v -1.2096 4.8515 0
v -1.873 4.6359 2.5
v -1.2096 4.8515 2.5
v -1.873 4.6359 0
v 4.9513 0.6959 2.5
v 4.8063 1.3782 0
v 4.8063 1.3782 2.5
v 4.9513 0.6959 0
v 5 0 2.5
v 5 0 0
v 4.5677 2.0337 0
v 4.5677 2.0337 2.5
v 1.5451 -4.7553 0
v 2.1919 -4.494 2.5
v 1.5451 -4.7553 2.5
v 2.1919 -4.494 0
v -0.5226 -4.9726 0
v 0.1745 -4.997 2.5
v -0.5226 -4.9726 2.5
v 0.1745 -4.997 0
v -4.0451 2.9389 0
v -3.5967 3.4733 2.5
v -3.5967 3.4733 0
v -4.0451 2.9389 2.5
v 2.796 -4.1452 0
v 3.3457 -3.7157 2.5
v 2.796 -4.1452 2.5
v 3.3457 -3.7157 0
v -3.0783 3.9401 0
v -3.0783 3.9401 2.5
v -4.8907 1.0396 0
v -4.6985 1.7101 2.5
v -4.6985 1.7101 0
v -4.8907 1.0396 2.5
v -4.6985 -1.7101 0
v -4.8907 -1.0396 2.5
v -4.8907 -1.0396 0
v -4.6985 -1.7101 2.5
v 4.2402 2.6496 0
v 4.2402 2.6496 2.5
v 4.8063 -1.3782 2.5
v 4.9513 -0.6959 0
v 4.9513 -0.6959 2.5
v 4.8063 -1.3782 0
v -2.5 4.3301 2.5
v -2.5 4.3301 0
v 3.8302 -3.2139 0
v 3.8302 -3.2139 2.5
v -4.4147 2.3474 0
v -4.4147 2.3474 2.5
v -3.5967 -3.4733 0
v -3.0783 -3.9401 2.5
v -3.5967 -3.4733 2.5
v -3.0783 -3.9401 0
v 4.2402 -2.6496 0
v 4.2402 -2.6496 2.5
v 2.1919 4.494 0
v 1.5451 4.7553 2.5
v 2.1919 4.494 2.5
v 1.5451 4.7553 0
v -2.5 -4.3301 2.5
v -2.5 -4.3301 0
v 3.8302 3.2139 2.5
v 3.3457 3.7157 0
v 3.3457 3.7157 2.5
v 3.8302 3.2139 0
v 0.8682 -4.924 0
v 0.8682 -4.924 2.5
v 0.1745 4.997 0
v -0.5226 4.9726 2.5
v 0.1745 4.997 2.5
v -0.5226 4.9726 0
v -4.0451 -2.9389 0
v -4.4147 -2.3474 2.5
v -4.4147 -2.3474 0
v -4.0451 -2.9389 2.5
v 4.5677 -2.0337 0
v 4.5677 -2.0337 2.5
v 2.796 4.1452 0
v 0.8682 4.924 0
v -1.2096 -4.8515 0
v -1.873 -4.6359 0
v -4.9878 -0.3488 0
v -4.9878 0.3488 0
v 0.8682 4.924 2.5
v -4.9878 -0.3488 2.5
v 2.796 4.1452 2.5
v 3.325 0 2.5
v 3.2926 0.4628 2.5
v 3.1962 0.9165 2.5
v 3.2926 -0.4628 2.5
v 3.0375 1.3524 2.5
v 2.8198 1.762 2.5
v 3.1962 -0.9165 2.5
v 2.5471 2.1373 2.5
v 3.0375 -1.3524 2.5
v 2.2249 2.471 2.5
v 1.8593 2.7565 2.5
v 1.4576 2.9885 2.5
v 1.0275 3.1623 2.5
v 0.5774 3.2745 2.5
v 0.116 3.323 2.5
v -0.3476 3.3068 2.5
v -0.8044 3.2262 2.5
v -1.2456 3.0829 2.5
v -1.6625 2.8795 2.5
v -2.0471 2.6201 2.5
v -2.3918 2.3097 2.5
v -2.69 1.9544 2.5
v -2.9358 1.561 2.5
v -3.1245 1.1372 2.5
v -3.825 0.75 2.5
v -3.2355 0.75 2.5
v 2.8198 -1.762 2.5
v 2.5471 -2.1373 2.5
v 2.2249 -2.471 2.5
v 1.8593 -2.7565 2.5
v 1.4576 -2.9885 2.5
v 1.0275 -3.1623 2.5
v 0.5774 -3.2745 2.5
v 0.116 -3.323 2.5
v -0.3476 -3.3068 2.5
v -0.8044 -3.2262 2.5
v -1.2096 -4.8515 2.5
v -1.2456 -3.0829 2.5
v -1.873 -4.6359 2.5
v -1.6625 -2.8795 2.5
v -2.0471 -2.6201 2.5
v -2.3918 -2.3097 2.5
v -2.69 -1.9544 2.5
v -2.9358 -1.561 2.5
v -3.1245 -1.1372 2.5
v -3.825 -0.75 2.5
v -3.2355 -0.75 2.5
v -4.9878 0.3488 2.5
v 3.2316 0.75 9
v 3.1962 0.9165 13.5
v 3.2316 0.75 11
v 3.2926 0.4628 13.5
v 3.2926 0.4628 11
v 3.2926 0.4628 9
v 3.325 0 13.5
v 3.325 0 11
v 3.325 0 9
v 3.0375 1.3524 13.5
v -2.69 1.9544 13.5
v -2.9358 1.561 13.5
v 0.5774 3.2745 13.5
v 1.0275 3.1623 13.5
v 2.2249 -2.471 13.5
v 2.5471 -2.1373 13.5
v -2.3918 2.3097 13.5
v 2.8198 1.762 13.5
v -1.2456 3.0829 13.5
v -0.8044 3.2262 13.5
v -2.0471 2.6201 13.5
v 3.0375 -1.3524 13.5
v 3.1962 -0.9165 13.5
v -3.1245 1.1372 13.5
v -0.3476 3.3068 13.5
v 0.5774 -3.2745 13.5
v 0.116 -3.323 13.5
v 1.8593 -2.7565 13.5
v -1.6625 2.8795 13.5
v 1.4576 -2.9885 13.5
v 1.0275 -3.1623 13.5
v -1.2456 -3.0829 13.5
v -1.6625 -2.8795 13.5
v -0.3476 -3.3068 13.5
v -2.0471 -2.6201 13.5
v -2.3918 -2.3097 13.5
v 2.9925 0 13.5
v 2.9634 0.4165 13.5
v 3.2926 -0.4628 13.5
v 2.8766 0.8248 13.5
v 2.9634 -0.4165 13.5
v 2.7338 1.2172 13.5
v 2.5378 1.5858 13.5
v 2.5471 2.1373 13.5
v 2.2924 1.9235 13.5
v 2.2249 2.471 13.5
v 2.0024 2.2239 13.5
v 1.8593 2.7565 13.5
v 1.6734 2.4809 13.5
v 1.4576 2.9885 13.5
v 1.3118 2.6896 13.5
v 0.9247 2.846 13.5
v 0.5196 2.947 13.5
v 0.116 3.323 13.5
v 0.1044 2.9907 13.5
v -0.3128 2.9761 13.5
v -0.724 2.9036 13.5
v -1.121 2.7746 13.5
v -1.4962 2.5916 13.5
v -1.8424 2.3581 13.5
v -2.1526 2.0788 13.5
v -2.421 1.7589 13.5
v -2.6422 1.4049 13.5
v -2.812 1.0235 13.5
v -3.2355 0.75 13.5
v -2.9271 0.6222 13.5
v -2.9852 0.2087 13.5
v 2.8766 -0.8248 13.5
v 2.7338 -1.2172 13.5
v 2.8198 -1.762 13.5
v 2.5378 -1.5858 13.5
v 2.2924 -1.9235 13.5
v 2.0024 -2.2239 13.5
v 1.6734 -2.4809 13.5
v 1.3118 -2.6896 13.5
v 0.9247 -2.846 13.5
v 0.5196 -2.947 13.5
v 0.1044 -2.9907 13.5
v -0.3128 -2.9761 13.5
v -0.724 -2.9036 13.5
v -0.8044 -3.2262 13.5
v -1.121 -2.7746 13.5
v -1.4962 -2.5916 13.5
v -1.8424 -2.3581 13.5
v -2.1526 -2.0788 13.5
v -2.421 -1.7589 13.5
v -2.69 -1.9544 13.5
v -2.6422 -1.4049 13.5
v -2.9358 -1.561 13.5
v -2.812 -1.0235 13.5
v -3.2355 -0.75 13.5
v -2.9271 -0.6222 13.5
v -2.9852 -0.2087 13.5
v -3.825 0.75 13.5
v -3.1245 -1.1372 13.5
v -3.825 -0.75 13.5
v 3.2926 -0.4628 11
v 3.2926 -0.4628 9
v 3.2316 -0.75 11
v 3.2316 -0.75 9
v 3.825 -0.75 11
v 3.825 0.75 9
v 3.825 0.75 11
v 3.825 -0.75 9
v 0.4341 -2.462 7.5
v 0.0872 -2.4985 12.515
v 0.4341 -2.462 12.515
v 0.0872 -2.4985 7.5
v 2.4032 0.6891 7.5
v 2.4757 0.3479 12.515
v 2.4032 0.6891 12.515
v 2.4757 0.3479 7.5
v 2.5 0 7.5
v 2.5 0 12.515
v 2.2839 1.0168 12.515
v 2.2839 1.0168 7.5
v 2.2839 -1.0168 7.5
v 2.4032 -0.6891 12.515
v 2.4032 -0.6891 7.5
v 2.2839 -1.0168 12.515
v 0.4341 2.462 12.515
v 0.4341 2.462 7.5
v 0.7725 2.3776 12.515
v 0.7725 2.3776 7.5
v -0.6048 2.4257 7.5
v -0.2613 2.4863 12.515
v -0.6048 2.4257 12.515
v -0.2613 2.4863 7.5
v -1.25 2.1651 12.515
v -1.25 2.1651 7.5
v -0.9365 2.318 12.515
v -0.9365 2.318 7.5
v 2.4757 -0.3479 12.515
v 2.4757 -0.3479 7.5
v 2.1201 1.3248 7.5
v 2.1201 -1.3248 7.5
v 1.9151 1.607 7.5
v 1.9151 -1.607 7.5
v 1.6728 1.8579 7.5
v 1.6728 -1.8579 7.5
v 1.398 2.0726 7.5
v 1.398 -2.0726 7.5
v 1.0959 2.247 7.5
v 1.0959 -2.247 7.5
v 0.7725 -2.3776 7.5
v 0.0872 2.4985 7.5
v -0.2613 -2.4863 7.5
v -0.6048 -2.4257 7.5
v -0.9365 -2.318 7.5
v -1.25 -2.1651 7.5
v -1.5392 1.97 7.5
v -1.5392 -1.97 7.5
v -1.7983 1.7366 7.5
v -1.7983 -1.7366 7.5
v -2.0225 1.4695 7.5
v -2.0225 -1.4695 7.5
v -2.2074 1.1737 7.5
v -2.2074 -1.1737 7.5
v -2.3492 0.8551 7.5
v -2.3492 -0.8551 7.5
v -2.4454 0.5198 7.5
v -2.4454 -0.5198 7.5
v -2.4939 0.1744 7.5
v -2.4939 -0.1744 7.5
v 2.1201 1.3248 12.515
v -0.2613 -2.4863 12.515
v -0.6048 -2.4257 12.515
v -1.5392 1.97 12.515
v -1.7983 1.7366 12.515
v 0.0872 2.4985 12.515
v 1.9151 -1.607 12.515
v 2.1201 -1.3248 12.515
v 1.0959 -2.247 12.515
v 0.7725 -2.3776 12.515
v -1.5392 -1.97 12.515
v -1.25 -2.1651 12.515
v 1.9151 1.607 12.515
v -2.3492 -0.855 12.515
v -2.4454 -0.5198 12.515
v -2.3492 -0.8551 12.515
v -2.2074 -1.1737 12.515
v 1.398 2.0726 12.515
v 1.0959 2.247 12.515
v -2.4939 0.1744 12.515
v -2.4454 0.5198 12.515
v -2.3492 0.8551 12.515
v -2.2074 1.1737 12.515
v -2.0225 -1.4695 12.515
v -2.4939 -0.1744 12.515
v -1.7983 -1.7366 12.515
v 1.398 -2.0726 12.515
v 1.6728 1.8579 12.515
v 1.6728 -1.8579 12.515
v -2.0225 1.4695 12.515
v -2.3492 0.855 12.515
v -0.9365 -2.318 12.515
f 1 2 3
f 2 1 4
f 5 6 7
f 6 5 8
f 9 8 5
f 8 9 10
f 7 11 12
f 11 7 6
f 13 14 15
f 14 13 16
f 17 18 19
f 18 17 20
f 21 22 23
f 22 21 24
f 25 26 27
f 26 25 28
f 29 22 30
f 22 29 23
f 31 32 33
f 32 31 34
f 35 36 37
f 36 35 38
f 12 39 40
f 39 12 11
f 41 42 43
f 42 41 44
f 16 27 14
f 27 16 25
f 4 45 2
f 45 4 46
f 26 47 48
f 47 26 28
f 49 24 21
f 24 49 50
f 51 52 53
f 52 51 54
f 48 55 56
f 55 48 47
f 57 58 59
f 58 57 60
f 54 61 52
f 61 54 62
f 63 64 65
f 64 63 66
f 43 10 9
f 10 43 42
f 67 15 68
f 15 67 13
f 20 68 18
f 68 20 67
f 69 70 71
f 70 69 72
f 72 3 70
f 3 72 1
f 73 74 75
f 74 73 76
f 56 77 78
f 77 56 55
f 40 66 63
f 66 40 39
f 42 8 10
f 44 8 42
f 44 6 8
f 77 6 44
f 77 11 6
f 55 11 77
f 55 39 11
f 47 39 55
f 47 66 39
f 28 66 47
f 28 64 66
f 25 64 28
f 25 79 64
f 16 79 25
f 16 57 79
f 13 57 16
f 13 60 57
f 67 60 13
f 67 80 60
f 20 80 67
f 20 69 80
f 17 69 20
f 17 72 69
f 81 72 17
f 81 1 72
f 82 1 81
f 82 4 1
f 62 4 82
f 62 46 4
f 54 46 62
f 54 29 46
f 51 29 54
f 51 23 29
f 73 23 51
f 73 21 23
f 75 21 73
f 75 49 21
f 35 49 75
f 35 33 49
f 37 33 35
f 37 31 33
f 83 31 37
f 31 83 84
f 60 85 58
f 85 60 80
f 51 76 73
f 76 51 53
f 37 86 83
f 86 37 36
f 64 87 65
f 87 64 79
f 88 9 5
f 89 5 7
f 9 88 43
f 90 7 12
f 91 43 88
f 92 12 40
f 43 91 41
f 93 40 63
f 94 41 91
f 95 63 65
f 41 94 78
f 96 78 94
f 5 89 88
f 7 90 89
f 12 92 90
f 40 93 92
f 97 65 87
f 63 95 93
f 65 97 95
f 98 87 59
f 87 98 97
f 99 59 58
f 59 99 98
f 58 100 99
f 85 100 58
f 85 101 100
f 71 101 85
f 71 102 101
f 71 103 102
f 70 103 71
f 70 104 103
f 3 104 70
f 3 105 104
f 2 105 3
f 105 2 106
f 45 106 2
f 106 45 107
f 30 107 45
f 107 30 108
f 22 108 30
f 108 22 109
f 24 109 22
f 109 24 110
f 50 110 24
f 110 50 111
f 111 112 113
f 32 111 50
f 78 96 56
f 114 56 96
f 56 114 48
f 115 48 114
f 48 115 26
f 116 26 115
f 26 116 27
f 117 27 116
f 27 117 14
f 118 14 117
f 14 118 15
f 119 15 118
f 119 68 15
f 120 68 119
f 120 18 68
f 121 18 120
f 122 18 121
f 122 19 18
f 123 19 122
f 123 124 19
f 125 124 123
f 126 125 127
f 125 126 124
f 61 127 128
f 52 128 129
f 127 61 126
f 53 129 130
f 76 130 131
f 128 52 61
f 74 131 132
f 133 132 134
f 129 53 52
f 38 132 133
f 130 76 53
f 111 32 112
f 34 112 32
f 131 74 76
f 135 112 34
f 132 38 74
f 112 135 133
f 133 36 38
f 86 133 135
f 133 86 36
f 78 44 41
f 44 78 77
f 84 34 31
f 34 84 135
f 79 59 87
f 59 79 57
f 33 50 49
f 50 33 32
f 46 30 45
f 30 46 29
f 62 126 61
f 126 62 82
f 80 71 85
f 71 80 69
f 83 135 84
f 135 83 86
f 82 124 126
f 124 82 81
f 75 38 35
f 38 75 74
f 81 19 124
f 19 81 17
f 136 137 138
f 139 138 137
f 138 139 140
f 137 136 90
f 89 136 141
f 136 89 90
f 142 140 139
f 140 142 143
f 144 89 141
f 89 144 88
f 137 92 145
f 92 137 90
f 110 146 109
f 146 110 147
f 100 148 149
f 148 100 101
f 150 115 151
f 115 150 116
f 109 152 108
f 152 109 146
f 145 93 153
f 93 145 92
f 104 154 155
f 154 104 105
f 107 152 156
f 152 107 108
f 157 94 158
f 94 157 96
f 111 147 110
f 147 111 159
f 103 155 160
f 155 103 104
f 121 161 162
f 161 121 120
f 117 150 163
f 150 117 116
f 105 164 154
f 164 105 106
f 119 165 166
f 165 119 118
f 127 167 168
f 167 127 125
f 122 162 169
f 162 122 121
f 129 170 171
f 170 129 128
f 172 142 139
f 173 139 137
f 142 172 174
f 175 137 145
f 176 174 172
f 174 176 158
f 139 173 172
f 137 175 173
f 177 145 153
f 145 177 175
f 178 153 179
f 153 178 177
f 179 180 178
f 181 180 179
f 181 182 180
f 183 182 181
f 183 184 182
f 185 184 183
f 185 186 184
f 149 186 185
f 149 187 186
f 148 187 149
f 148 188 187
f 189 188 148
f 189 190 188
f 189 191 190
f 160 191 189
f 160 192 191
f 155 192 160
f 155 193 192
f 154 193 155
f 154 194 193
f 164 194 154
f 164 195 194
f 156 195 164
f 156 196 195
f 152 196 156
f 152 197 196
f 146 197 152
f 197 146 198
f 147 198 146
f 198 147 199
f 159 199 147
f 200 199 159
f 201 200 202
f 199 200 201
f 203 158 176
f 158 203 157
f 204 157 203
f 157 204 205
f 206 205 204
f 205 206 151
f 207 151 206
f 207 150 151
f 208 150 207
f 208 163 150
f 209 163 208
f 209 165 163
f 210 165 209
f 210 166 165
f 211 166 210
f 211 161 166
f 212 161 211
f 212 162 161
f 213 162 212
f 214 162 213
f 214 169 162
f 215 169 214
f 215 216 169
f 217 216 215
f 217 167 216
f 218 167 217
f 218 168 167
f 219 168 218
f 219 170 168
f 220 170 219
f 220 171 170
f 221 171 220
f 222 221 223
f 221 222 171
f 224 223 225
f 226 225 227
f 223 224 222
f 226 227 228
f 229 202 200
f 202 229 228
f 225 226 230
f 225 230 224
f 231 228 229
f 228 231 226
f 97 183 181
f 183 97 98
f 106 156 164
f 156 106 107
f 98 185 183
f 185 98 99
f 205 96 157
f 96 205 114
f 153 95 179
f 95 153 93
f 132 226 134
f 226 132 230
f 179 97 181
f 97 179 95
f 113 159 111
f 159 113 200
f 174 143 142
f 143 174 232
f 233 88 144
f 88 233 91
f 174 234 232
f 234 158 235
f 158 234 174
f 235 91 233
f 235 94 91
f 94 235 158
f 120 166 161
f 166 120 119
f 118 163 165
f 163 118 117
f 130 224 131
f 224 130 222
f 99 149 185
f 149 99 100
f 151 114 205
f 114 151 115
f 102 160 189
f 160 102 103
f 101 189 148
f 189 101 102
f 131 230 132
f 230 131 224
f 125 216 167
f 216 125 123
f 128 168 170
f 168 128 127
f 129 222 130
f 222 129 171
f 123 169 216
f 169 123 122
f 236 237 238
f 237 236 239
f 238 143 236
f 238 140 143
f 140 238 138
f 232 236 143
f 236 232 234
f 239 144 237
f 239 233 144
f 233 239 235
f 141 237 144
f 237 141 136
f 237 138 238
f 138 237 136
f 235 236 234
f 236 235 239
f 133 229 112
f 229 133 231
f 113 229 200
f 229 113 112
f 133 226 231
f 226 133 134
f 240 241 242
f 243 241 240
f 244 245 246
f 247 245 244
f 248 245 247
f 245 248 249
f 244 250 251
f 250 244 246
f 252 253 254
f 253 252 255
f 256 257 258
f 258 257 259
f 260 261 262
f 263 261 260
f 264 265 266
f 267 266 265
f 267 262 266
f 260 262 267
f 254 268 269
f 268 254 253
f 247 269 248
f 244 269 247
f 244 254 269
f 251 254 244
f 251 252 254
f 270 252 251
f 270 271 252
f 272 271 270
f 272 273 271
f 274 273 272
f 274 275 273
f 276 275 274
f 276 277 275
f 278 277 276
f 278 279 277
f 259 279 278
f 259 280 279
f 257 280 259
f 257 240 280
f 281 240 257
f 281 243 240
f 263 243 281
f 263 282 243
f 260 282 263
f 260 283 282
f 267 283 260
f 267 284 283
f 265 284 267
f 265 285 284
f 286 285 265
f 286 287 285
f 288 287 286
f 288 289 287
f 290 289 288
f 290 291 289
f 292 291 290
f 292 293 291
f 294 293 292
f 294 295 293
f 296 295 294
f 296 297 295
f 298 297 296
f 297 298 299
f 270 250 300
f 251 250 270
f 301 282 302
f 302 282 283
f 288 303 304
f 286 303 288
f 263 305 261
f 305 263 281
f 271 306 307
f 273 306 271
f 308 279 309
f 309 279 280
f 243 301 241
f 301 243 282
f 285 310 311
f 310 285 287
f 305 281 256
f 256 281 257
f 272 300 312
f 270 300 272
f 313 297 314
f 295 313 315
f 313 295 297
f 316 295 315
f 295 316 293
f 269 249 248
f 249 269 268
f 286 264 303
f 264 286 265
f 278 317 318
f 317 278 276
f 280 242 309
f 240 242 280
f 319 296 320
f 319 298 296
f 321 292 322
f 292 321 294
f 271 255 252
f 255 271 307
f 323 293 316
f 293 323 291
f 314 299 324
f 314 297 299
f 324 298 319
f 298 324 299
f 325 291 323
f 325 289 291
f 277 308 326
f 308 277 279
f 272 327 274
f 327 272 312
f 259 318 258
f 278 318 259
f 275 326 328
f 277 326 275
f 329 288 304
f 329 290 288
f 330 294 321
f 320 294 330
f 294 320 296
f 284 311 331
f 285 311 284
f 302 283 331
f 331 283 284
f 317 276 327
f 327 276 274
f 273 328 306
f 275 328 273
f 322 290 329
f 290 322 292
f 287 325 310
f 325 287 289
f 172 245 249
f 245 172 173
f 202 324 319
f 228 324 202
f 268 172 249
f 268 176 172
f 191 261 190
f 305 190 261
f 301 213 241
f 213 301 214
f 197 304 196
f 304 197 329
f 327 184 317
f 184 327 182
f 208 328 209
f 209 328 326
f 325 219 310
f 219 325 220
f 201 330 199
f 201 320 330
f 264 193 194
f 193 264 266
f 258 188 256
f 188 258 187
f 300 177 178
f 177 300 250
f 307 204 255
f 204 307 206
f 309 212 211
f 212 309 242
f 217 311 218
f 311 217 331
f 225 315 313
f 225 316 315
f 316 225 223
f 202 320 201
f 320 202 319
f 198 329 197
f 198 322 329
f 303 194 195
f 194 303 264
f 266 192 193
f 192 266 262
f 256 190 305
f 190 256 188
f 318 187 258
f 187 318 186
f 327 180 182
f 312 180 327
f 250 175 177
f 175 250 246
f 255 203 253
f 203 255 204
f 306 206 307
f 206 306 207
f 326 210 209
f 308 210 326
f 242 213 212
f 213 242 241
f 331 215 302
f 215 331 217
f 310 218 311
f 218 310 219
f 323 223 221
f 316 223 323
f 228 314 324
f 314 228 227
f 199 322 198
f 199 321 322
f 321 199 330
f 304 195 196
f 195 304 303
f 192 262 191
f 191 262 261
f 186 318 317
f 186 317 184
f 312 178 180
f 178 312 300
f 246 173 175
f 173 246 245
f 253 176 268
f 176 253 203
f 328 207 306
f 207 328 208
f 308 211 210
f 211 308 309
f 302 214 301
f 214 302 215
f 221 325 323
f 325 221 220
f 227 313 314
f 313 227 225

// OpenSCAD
/*
 *  PLAYMOBIL Net Cannon Button for Enemy Quad with Triceratops Building Set (9434)
 *  Copyright (c) 2020 David M. Syzdek <david@syzdek.net>
 *
 *  Redistribution and use in source and binary forms, with or without
 *  modification, are permitted provided that the following conditions are
 *  met:
 *
 *     * Redistributions of source code must retain the above copyright
 *       notice, this list of conditions and the following disclaimer.
 *     * Redistributions in binary form must reproduce the above copyright
 *       notice, this list of conditions and the following disclaimer in the
 *       documentation and/or other materials provided with the distribution.
 *     * Neither the name of David M. Syzdek nor the
 *       names of its contributors may be used to endorse or promote products
 *       derived from this software without specific prior written permission.
 *
 *  THIS SOFTWARE IS PROVIDED BY THE COPYRIGHT HOLDERS AND CONTRIBUTORS "AS
 *  IS" AND ANY EXPRESS OR IMPLIED WARRANTIES, INCLUDING, BUT NOT LIMITED TO,
 *  THE IMPLIED WARRANTIES OF MERCHANTABILITY AND FITNESS FOR A PARTICULAR
 *  PURPOSE ARE DISCLAIMED. IN NO EVENT SHALL DAVID M. SYZDEK BE LIABLE FOR
 *  ANY DIRECT, INDIRECT, INCIDENTAL, SPECIAL, EXEMPLARY, OR CONSEQUENTIAL
 *  DAMAGES (INCLUDING, BUT NOT LIMITED TO, PROCUREMENT OF SUBSTITUTE GOODS OR
 *  SERVICES; LOSS OF USE, DATA, OR PROFITS; OR BUSINESS INTERRUPTION) HOWEVER
 *  CAUSED AND ON ANY THEORY OF LIABILITY, WHETHER IN CONTRACT, STRICT
 *  LIABILITY, OR TORT (INCLUDING NEGLIGENCE OR OTHERWISE) ARISING IN ANY WAY
 *  OUT OF THE USE OF THIS SOFTWARE, EVEN IF ADVISED OF THE POSSIBILITY OF
 *  SUCH DAMAGE.
 */
/*
 *  This is a replacement button for the button on the net cannon of the PLAYMOBILE
 *  Enemy Quad with Triceratops Building Set (9434).  The tab which holds the button
 *  in the cannon broke which allows the button to fall out unless it is being
 *  pushed.  The net "harpoon" has a tendency to load at a slight angle which pushes
 *  against the button.  I believe that "snapping" the harpoon into place dislodged
 *  the button thus breaking the tab holding the button in the cannon.  This part
 *  is designed with a chamfer on the bore of the button to help guide the "harpoon"
 *  into the correct position.
 *
 *  I made this design initially without exact measurements, but added variables
 *  to allow the part to be adjusted to the correct size once the measurements
 *  could be taken.
 */


// button diameter
bd = 10;

// button length
bl = 2.5;

// cylinder length
cl = 11;

// cylinder outside diameter
cod = 6.65;

// cylinder inside diameter
cid = 5;

// tab height
th = 0.5;

// tab length
tl = 2;

// tab width
tw = 1.5;

// tab offset from end of cylinder
to = 2.5;

$fn = 45;


// bd  - button diameter
// bl  - button length
// cl  - cylinder length
// cod - cylinder outside diameter
// cid - cylinder inside diameter
// th  - tab height
// tl  - tab length
// tw  - tab width
// to  - tab offset from end of cylinder
module playmobile_button_9434(bd, bl, cl, cod, cid, th, tl, tw, to)
{
   difference()
   {
      union()
      {
         // base
         translate([  0, 0, 0 ]) cylinder( h = bl,    d = bd,  center = false );
         
         // cylinder
         translate([  0, 0, 0 ]) cylinder( h = bl+cl, d = cod, center = false );

         // catch tab
         translate([  (cod/2)-(cod-cid), 0-(tw/2), (bl+cl-tl-to) ])
            cube( size = [th+(cod-cid), tw, tl], center = false );

         // guide rail
         translate([  0-(cod/2)-th, 0-(tw/2), 0 ])
            cube( size = [th+(cod-cid), tw, bl+cl], center = false );
      };
      
      // cylinder bore
      translate([  0, 0, bl+5.0 ])
         cylinder( h = (cl+1),  d = cid, center = false );
      
      // cylinder interior chamfer
      translate([  0, 0, bl+cl-(cod*0.9) ])
         cylinder( h = cod, d1 = 0, d2 = cod, center = false );
   };
};

playmobile_button_9434(bd, bl, cl, cod, cid, th, tl, tw, to);


/* end of script */
